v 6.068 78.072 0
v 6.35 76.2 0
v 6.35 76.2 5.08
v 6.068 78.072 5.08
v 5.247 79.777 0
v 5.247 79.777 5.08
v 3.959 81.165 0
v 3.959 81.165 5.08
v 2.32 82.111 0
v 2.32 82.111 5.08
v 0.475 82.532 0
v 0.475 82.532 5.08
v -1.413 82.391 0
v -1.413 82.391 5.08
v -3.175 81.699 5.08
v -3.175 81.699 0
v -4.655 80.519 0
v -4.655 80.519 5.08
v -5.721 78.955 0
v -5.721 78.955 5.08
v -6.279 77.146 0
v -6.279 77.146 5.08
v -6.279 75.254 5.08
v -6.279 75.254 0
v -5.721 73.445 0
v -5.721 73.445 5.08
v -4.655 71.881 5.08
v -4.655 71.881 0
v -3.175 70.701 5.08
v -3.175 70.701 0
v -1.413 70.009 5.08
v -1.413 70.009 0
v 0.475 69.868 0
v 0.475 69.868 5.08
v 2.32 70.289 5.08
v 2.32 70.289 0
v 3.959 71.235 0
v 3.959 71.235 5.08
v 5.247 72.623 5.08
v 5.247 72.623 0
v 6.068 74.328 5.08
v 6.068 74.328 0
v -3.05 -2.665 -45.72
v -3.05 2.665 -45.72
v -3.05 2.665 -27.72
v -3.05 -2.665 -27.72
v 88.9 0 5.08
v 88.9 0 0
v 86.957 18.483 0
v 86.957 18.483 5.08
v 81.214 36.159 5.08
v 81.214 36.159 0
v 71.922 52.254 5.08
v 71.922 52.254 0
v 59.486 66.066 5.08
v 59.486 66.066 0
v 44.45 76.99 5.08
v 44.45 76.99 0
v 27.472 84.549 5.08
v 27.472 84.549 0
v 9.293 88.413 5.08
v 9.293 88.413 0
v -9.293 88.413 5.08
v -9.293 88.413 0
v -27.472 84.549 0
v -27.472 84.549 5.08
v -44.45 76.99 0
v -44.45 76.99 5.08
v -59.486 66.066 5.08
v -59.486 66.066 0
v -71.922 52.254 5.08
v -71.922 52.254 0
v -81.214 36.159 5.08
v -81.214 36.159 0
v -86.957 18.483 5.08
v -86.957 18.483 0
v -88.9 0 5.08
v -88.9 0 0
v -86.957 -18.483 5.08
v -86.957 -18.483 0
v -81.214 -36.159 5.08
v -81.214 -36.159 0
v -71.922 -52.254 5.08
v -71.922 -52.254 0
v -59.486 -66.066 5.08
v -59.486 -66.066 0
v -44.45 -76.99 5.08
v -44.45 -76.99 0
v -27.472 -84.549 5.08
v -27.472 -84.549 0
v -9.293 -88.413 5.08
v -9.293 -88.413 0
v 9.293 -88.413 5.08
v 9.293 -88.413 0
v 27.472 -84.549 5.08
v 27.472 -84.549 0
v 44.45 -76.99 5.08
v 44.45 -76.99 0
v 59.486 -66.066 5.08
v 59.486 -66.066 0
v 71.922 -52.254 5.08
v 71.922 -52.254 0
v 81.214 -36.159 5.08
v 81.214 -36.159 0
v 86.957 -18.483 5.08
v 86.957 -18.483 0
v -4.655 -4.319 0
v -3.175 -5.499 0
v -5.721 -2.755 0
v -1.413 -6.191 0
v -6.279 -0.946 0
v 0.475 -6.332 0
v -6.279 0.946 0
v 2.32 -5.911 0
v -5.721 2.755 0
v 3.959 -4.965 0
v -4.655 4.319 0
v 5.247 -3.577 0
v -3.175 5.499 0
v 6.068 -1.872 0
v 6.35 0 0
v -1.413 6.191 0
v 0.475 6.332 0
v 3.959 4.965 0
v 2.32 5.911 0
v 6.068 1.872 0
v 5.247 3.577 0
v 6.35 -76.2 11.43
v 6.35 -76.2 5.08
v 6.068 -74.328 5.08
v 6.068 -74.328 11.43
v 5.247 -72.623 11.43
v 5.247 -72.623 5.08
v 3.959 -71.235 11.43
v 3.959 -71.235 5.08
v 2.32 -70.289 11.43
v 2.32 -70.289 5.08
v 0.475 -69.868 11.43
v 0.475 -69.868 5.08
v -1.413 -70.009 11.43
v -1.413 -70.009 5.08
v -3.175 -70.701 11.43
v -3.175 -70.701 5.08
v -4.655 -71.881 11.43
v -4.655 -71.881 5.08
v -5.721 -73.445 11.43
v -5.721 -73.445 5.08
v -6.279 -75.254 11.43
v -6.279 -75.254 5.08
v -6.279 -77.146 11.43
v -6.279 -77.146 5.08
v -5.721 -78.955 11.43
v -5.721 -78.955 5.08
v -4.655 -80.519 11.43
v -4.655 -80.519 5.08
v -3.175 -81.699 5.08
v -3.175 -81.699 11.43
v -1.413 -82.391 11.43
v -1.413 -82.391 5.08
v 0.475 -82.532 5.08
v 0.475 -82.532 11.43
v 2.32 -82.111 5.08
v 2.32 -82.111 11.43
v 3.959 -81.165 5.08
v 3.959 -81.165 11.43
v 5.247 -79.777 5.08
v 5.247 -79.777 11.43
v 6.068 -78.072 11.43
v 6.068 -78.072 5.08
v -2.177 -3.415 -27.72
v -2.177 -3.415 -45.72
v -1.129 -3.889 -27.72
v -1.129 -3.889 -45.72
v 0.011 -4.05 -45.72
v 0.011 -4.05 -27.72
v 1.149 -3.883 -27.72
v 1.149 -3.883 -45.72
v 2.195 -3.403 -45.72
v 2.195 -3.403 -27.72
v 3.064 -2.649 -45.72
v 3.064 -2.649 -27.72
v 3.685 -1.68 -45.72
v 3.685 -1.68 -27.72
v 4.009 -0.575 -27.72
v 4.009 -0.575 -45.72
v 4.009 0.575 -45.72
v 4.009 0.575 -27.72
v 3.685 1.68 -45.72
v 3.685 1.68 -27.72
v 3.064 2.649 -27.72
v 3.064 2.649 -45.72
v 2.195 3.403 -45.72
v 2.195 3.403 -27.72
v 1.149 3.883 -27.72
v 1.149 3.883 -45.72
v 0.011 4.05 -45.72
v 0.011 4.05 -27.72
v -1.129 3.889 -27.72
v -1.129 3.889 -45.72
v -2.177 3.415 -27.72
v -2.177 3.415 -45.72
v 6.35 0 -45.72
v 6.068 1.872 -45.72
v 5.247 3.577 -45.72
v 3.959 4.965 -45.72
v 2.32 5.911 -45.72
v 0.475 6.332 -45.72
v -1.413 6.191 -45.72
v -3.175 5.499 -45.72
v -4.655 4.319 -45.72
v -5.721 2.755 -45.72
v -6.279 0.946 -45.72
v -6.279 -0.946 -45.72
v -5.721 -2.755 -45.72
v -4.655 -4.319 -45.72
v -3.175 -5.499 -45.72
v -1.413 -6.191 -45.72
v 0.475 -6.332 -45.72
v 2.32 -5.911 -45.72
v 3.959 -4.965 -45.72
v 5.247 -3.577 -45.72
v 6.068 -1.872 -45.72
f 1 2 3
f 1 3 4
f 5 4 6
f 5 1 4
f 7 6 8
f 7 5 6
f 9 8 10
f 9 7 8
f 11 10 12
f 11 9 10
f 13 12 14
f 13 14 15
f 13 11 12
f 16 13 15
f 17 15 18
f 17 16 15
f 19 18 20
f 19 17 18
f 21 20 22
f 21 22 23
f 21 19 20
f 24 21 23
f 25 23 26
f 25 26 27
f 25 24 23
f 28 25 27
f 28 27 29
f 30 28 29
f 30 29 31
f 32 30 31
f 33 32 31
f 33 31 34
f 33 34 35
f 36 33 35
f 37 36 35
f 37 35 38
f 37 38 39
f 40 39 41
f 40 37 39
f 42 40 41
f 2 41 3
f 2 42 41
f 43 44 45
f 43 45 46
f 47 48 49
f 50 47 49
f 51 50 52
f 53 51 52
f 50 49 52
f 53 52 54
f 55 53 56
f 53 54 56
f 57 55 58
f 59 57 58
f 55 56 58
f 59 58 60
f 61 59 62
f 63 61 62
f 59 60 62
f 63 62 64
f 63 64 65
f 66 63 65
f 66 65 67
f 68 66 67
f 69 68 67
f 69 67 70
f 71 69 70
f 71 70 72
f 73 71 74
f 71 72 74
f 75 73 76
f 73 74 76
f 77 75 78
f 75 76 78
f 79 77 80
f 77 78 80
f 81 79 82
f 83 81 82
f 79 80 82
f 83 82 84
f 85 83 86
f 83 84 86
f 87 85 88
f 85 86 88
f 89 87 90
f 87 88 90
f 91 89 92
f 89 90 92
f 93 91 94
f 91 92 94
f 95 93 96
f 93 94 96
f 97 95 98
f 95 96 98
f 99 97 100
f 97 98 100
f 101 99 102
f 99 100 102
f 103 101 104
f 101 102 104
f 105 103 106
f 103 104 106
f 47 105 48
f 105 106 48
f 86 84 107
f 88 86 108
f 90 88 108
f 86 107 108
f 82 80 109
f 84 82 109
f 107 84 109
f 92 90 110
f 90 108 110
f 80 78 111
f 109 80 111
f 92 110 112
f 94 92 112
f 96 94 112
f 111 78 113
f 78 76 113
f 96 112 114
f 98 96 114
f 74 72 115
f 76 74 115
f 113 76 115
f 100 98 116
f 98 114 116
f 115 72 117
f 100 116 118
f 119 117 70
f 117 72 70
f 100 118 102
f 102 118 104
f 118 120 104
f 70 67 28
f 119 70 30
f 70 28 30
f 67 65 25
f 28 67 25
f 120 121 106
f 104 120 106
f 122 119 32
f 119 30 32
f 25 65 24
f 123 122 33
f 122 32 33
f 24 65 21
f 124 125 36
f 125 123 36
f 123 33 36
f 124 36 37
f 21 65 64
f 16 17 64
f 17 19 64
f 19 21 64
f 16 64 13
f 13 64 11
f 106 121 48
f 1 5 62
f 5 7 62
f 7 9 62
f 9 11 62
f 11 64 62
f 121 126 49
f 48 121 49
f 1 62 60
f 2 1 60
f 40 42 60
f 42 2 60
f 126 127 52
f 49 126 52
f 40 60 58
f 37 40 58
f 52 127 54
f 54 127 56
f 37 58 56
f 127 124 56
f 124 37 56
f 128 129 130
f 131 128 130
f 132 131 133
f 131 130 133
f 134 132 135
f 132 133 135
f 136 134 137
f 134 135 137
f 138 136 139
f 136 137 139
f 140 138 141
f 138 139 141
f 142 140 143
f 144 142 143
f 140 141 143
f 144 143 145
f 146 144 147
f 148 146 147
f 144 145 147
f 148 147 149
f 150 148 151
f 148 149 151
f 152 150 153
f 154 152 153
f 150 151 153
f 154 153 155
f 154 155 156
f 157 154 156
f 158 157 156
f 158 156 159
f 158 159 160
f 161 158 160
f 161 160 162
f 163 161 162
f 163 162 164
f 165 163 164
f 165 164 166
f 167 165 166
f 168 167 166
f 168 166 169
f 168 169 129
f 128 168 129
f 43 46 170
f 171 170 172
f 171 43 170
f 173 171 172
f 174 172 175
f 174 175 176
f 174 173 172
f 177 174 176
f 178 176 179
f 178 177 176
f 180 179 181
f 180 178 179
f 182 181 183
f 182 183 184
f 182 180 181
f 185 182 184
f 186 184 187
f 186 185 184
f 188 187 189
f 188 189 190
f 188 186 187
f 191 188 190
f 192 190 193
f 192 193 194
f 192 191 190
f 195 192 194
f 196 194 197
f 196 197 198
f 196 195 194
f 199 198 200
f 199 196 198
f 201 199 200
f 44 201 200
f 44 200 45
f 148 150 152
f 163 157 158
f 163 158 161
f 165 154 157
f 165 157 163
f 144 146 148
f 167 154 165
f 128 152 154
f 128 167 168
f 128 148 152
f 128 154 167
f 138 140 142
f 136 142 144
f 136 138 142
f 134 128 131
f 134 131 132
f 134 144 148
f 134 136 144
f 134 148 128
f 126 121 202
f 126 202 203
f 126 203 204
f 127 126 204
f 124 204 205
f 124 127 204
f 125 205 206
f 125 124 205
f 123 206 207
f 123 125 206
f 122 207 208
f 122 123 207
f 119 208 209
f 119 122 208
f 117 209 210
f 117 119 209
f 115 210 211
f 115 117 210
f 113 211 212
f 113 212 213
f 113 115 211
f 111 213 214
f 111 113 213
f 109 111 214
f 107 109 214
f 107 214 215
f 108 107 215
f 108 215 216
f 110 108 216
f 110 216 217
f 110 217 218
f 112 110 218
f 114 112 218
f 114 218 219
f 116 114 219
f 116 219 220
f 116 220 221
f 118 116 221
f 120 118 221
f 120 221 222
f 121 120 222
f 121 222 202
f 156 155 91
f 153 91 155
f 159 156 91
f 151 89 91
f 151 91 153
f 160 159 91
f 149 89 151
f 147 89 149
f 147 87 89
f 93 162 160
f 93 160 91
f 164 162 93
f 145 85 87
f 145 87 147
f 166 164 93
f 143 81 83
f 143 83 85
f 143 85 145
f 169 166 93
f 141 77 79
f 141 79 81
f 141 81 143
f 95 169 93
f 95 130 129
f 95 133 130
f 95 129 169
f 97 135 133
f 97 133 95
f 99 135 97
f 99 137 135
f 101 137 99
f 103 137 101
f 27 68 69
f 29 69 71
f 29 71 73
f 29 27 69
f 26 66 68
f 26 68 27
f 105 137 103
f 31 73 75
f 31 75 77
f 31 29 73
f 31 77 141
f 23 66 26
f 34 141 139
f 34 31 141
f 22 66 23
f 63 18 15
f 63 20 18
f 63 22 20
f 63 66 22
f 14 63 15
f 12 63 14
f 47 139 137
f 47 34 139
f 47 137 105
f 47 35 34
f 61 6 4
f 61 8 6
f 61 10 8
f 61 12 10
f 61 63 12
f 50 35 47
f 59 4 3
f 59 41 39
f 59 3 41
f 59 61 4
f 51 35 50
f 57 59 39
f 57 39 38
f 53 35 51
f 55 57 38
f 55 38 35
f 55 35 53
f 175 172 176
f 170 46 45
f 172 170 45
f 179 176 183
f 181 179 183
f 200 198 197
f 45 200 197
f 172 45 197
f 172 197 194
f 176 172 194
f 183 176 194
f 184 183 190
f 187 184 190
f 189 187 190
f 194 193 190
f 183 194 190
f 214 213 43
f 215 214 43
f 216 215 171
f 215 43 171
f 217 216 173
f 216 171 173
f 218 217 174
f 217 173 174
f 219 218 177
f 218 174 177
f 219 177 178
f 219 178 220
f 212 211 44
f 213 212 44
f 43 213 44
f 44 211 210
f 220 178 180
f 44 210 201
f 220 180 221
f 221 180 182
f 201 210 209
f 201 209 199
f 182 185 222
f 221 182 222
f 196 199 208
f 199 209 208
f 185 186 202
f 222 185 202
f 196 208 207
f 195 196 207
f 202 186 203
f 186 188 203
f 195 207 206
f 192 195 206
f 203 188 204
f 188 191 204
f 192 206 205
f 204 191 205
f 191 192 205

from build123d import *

# Parameters (mm, degrees)
SKETCH1_R           = 88.9
SKETCH1_R_2         = 6
SKETCH1_R_3         = 6.35
BOSS_EXTRUDE1_DEPTH = 5.08
SKETCH2_R           = 6.35
BOSS_EXTRUDE2_DEPTH = 11.43
SKETCH3_R           = 6.35
BOSS_EXTRUDE3_DEPTH = 50.8
CUT_EXTRUDE1_DEPTH  = 18


with BuildPart() as part:
    # Sketch1 → Boss-Extrude1 (new body)
    with BuildSketch(Plane.XY):
        Circle(SKETCH1_R)
        Circle(SKETCH1_R_2, mode=Mode.SUBTRACT)
        with Locations((0, -76.2)):
            Circle(SKETCH1_R_3, mode=Mode.SUBTRACT)
        with Locations((0, 76.2)):
            Circle(SKETCH1_R_3, mode=Mode.SUBTRACT)
    extrude(amount=BOSS_EXTRUDE1_DEPTH)

    # Sketch2 → Boss-Extrude2 (add)
    with BuildSketch(Plane.XY):
        with Locations((0, -76.2)):
            Circle(SKETCH2_R)
    extrude(amount=BOSS_EXTRUDE2_DEPTH)

    # Sketch3 → Boss-Extrude3 (add)
    with BuildSketch(Plane.XY.offset(5.08)):
        Circle(SKETCH3_R)
    extrude(amount=-BOSS_EXTRUDE3_DEPTH)

    # Sketch4 → Cut-Extrude1 (cut)
    with BuildSketch(Plane(origin=(0, 0, -45.72), x_dir=(-1, 0, 0), z_dir=(0, 0, -1))):
        with BuildLine():
            Line((3.05, 2.664582519), (3.05, -2.664582519))
            ThreePointArc((3.05, -2.664582519), (-4.05, 0), (3.05, 2.664582519))
        make_face()
    extrude(amount=-CUT_EXTRUDE1_DEPTH, mode=Mode.SUBTRACT)


solid = part.part
